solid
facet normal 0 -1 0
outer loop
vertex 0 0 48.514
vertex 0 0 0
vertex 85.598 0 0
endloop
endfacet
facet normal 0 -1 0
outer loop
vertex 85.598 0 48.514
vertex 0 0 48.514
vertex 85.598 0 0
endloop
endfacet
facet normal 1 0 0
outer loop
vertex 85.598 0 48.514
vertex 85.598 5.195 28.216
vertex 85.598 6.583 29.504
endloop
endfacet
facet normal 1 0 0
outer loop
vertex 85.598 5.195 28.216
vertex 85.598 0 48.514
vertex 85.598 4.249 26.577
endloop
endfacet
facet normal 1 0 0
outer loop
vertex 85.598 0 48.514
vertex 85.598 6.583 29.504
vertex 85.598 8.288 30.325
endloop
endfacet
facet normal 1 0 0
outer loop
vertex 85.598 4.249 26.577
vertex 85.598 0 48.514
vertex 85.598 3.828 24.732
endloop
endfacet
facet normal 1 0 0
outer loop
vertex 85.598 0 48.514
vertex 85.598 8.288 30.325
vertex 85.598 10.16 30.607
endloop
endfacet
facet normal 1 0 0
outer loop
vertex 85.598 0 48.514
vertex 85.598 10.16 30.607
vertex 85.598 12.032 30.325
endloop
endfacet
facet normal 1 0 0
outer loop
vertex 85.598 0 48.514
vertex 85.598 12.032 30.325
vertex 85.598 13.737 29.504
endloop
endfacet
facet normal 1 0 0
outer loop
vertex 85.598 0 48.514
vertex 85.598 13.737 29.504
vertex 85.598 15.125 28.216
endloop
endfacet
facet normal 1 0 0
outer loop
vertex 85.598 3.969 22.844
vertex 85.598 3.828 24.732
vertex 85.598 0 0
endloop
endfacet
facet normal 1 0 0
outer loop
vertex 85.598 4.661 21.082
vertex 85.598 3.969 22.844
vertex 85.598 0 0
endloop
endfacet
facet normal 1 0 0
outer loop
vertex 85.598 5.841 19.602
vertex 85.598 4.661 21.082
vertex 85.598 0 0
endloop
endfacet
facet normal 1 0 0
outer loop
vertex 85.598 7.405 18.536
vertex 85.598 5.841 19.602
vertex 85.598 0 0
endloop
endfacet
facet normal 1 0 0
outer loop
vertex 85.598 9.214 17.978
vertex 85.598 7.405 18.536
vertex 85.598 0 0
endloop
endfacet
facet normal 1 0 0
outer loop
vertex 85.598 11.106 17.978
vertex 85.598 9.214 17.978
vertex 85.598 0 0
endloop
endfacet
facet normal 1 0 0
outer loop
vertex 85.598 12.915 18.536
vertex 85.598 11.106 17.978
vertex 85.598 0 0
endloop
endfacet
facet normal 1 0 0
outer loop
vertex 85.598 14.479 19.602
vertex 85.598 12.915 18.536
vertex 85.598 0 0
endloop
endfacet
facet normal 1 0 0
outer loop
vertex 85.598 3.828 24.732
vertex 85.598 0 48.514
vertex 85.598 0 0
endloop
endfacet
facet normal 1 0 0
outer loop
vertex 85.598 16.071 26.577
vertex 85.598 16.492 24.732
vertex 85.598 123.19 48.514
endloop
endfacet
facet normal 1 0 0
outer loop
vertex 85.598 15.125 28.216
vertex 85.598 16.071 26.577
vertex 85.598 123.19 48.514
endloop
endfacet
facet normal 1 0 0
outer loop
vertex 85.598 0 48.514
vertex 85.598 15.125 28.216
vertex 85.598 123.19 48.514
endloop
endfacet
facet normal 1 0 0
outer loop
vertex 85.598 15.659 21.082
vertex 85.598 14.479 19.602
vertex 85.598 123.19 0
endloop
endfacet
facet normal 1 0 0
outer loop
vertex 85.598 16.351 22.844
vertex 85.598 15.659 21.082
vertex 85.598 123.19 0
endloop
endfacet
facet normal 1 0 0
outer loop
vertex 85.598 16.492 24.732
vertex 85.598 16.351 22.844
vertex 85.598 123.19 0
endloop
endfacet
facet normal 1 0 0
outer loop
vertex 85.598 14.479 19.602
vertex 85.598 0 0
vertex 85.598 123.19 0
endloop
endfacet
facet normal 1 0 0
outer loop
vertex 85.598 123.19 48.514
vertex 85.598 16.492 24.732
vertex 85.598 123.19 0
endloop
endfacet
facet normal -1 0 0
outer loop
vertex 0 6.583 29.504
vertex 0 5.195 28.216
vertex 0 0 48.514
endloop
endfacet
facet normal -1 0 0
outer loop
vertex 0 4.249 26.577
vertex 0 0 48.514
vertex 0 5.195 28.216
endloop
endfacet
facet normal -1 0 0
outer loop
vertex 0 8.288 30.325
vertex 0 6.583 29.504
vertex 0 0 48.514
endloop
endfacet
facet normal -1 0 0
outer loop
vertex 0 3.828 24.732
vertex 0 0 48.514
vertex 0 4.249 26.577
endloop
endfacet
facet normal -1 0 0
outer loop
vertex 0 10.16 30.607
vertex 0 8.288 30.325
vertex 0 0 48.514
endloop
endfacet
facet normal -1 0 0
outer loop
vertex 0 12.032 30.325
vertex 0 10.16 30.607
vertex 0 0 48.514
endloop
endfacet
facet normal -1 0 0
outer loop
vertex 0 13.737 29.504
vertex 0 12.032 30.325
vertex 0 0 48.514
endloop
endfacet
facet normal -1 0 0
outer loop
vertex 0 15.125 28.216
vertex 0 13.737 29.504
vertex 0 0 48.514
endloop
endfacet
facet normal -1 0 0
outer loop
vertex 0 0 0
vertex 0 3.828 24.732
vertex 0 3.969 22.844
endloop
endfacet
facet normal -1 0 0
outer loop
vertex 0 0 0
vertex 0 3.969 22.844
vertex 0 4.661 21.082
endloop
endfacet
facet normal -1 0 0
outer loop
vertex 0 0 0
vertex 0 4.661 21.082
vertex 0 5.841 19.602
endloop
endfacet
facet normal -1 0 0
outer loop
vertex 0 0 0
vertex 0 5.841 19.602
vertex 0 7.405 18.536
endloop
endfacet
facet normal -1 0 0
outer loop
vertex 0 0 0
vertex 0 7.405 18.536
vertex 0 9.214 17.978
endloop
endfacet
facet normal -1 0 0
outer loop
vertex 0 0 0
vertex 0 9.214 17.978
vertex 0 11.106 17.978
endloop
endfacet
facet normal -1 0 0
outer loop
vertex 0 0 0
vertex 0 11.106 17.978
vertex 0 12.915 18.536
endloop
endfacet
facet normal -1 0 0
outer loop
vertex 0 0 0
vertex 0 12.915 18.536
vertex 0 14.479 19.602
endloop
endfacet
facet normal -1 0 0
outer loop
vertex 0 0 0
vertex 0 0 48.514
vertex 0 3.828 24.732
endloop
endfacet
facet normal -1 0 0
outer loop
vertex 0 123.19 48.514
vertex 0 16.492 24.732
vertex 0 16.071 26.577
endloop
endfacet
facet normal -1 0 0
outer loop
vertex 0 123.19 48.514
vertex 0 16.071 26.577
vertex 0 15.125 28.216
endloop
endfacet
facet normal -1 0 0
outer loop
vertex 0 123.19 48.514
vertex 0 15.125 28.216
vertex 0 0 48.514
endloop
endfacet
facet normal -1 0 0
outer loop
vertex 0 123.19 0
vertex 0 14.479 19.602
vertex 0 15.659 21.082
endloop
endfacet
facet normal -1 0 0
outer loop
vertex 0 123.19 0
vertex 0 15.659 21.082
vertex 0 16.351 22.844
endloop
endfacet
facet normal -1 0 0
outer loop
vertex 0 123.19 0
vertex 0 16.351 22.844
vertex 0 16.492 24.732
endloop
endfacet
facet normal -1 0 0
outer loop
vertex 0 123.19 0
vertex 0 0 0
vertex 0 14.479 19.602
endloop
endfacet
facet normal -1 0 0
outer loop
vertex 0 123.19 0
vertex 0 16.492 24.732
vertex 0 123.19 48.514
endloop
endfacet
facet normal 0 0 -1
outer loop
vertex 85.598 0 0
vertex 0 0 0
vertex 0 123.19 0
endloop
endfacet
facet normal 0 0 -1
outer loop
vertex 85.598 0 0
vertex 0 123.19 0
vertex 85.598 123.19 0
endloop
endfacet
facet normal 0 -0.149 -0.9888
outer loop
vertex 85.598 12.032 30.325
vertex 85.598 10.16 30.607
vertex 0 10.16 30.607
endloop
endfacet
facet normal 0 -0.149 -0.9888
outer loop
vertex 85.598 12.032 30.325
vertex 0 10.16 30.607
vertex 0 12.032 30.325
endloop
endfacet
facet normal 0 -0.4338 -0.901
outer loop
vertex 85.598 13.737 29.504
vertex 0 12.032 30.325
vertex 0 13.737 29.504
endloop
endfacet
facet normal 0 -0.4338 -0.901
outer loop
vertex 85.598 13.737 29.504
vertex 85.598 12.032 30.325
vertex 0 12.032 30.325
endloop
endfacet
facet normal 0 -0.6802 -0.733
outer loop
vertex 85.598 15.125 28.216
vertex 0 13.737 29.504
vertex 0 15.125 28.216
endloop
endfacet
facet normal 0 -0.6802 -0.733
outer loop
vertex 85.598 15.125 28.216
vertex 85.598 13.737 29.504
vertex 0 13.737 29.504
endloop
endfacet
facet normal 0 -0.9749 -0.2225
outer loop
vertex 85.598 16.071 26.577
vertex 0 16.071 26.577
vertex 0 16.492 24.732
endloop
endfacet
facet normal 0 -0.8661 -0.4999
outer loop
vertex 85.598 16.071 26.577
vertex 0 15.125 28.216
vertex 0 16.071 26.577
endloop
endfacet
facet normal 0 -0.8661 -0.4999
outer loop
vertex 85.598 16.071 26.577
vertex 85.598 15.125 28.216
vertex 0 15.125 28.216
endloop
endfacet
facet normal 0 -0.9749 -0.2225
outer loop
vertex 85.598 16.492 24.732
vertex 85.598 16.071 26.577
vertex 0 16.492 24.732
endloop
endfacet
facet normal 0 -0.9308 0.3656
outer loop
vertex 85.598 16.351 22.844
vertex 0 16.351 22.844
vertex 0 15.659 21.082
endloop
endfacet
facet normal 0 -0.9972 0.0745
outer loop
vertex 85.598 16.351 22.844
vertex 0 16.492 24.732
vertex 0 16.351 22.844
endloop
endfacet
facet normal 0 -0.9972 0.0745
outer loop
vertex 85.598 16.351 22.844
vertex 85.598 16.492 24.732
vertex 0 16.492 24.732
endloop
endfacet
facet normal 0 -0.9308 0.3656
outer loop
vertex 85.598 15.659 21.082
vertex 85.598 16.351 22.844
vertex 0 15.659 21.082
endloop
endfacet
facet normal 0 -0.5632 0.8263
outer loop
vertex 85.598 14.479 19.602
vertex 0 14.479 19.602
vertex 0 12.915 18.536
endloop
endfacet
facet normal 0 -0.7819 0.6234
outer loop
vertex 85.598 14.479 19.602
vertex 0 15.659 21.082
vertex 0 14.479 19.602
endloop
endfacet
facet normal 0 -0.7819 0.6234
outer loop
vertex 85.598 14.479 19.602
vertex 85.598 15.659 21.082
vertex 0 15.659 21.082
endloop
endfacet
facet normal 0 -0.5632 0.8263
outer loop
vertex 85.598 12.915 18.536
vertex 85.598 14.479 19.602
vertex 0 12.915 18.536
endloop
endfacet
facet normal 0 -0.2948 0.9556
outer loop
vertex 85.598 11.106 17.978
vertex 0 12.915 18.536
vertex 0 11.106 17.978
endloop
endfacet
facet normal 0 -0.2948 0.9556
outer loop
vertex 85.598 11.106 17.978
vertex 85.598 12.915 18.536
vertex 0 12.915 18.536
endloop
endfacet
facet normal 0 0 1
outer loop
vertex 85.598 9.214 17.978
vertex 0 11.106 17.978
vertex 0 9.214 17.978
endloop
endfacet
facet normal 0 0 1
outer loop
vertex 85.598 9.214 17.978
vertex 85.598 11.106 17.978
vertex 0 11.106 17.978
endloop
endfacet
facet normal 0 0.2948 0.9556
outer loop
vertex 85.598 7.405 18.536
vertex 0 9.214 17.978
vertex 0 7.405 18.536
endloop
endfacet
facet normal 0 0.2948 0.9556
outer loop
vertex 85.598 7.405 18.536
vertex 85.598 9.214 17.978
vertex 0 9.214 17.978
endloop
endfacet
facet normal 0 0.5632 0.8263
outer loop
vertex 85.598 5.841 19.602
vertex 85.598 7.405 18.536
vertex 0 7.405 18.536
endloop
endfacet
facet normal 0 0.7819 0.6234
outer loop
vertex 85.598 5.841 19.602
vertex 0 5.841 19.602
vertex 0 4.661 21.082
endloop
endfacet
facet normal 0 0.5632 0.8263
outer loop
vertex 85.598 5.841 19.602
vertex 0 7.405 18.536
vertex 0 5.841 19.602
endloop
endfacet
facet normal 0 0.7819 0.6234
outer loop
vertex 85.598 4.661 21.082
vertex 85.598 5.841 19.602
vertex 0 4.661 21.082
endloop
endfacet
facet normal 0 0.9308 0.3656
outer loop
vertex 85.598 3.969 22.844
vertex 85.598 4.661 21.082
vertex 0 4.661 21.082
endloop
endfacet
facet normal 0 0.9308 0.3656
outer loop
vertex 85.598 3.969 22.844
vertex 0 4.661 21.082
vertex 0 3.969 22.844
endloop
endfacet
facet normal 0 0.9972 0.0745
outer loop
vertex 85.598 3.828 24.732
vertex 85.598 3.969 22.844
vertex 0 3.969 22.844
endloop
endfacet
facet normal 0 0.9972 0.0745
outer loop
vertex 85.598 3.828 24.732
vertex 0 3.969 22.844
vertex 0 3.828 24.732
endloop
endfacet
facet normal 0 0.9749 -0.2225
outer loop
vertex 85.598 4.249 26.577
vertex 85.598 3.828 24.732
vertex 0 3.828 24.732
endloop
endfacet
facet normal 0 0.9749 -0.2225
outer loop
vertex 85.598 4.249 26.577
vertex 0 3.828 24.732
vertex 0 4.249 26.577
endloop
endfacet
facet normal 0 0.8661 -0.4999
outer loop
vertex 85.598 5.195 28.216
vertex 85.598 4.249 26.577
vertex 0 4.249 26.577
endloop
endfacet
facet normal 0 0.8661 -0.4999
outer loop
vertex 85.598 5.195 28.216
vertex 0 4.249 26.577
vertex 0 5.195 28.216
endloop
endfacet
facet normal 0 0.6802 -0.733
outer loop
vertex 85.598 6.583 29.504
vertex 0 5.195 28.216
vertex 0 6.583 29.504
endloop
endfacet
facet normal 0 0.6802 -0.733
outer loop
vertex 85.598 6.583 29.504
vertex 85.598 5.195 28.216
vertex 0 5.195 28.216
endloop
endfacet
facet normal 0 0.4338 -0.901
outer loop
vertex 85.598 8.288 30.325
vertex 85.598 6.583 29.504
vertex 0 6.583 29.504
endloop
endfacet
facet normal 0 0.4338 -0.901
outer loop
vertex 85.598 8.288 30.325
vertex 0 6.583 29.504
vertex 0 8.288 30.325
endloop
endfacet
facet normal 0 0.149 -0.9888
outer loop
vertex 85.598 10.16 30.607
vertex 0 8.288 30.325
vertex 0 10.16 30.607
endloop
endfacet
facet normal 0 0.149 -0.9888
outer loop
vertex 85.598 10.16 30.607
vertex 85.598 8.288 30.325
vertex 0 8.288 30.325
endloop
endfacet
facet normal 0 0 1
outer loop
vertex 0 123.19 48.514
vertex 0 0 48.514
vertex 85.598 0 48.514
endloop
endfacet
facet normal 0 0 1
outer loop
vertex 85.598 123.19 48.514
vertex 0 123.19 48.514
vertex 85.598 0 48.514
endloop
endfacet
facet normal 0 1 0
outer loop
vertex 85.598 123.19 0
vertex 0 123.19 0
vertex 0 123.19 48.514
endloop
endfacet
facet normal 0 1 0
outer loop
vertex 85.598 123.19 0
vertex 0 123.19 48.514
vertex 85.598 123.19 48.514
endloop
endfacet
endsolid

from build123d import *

# Parameters (mm, degrees)
SKETCH2_W               = 85.598
SKETCH2_H               = 123.19
BOSS_EXTRUDE1_DEPTH     = 48.514
CUT_EXTRUDE1_DEPTH      = 158.659131991
CUT_EXTRUDE1_DEPTH_BACK = 158.659131991
SKETCH3_R               = 6.35


with BuildPart() as part:
    # Sketch2 → Boss-Extrude1 (new body)
    with BuildSketch(Plane.XY):
        with Locations((42.799, 61.595)):
            Rectangle(SKETCH2_W, SKETCH2_H)
    extrude(amount=BOSS_EXTRUDE1_DEPTH)

    # Sketch3 → Cut-Extrude1 (cut, two sides: drawn at the far end of the back side and taken through both)
    with BuildSketch(Plane.ZY.offset(-CUT_EXTRUDE1_DEPTH_BACK)):
        with Locations((24.257, 10.16)):
            Circle(SKETCH3_R)
    extrude(amount=CUT_EXTRUDE1_DEPTH + CUT_EXTRUDE1_DEPTH_BACK, mode=Mode.SUBTRACT)


solid = part.part
